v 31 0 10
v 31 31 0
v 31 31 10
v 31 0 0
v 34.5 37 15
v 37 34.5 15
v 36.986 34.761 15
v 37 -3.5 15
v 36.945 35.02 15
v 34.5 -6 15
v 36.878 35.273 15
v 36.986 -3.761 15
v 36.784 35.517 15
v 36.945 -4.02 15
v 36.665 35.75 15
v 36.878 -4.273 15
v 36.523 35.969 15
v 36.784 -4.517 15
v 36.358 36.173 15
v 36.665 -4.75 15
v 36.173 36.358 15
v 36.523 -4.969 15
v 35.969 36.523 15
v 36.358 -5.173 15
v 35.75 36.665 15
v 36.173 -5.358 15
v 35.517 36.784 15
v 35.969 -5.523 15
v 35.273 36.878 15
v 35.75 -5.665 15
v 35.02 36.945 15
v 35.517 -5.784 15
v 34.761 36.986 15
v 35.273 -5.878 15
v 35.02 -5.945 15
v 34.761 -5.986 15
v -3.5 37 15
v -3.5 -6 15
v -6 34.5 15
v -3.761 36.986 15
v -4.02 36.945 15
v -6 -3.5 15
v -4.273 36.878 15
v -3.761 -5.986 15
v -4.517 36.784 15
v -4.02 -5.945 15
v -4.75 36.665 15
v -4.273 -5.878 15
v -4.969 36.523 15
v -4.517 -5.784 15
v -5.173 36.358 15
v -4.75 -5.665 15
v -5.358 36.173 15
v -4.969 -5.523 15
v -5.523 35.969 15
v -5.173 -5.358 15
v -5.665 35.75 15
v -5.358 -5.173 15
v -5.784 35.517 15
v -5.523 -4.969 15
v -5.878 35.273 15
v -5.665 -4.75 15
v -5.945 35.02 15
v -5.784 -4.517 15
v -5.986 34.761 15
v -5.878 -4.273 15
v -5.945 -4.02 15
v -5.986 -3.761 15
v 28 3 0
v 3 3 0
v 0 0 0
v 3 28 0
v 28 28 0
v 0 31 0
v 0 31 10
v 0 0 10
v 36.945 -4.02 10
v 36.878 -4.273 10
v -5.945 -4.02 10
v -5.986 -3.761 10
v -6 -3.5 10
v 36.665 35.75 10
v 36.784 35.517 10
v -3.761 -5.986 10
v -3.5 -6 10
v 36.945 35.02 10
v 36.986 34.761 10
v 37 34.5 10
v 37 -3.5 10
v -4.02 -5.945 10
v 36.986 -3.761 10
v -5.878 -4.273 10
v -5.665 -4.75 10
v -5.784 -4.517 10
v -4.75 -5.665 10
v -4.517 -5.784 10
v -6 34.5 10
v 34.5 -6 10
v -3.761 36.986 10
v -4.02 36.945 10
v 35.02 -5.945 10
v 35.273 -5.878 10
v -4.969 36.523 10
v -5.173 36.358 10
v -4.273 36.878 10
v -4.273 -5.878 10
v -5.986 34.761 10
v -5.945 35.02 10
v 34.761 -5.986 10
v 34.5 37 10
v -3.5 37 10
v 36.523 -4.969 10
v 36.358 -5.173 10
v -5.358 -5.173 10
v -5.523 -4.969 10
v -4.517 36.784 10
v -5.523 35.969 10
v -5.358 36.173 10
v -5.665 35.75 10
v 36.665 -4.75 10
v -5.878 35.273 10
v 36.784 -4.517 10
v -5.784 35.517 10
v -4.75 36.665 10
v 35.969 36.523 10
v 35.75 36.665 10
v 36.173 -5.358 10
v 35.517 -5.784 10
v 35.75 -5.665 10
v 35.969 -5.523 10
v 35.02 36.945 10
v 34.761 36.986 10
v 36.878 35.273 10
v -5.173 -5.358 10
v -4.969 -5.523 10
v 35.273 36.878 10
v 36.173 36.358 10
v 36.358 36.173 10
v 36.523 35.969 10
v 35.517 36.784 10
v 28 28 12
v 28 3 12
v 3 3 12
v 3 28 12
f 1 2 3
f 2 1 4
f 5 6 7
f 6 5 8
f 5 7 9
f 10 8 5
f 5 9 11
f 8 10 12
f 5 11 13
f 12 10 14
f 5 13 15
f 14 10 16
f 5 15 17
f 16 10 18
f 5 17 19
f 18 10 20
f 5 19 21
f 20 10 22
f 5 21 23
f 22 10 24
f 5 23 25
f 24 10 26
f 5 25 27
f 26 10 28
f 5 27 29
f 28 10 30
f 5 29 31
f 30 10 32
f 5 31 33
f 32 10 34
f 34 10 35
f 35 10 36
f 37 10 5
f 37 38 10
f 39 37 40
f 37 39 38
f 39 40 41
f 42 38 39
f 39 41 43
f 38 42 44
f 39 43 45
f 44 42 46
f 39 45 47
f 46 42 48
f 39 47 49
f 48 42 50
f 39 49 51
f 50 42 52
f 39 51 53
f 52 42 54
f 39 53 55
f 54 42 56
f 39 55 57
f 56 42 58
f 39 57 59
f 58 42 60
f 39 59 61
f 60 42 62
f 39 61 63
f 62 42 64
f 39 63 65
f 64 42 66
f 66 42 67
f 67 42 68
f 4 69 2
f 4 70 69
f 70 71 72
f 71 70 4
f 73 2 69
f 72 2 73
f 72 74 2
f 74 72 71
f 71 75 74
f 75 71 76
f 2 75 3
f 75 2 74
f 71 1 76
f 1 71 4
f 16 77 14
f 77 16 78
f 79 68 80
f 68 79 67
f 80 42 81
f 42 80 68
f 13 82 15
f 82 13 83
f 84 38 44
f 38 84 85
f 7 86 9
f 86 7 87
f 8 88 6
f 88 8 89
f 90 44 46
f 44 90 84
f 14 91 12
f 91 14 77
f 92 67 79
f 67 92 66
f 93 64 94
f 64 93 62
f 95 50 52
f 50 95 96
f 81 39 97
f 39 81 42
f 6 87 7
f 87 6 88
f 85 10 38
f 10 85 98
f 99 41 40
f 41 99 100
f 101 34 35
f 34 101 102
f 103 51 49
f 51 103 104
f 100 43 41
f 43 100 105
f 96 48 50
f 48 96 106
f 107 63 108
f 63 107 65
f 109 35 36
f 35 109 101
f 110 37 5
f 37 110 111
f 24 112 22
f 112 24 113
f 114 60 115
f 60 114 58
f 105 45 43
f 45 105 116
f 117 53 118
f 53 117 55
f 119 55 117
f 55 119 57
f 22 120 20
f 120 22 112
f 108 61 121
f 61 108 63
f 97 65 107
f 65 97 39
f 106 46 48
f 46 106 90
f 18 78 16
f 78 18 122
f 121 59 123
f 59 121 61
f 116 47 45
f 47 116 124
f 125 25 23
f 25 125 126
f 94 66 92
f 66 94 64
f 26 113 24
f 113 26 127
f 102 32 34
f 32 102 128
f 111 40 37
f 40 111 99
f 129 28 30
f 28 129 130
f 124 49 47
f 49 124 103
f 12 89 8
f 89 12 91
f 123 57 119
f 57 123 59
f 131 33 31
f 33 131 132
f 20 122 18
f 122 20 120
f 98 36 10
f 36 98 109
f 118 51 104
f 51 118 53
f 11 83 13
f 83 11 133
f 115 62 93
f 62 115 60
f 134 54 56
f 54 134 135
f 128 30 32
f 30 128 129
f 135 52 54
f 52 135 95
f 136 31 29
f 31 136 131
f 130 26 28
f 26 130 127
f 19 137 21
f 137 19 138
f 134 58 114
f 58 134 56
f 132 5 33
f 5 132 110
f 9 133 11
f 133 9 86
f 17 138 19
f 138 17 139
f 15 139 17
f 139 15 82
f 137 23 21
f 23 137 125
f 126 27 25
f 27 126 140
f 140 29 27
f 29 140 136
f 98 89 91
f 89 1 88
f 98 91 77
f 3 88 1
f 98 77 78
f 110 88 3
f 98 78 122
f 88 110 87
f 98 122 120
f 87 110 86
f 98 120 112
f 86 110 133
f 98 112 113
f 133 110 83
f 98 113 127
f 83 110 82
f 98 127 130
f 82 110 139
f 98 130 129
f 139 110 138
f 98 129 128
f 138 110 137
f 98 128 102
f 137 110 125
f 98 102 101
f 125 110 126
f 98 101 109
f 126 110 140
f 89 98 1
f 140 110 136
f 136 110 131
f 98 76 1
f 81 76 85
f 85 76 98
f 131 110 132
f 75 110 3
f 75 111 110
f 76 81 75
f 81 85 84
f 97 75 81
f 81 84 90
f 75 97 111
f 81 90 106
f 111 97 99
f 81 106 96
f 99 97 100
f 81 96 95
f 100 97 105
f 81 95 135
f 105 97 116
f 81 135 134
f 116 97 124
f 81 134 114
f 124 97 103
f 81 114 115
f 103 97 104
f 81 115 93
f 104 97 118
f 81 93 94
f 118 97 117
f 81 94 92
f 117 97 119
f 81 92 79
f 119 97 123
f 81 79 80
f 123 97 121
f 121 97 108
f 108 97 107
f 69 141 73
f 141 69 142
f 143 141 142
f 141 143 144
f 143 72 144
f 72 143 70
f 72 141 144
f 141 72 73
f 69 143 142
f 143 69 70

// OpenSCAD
// file: widgets/_mount.scad
// Ansible widget cases
//
// Mount: base mount for widgets
// -----------------------------------------------------------------------------

include <../params.scad>;

// -----------------------------------------------------------------------------

module widget_mount() {
	color(WIDGET_MOUNT_COLOR) {
		// Square base
		difference() {
			// Outside
			union() {
				// Base
				cube([WIDGET_MOUNT_SIZE, WIDGET_MOUNT_SIZE, MOUNT_HEIGHT]);
				
				// Grip
				translate([
					-GRIP_THICKNESS / 2,
					-GRIP_THICKNESS / 2,
					MOUNT_HEIGHT - GRIP_HEIGHT
				])
					linear_extrude(height=GRIP_HEIGHT)
					hull() {
						translate([
							0,
							0,
							0
						])
							circle(r=WIDGET_BORDER_RADIUS, $fn=SEGMENTS);
					
						translate([
							WIDGET_MOUNT_SIZE + GRIP_THICKNESS,
							0,
							0
						])
							circle(r=WIDGET_BORDER_RADIUS, $fn=SEGMENTS);
					
						translate([
							0,
							WIDGET_MOUNT_SIZE + GRIP_THICKNESS,
							0,
						])
							circle(r=WIDGET_BORDER_RADIUS, $fn=SEGMENTS);
					
						translate([
							WIDGET_MOUNT_SIZE + GRIP_THICKNESS,
							WIDGET_MOUNT_SIZE + GRIP_THICKNESS,
							0,
						])
							circle(r=WIDGET_BORDER_RADIUS, $fn=SEGMENTS);
					}
			}
			
			// Carve out inside
			translate([
				WIDGET_MOUNT_THICKNESS,
				WIDGET_MOUNT_THICKNESS,
				-WIDGET_MOUNT_THICKNESS
			])
				cube([
					WIDGET_MOUNT_SIZE - WIDGET_MOUNT_THICKNESS * 2,
					WIDGET_MOUNT_SIZE - WIDGET_MOUNT_THICKNESS * 2,
					MOUNT_HEIGHT
				]);
		}
	}
}
// file: params.scad
// Ansible widget cases
//
// Params: sets the we want
// -----------------------------------------------------------------------------

// Overall case
CASE_WIDTH = 90;
CASE_LENGTH = 140;
CASE_HEIGHT = 55;
WALL_THICKNESS = 3;
FLOOR_THICKNESS = WALL_THICKNESS;
SEGMENTS = 60;

// -----------------------------------------------------------------------------

// Front door
FRONT_DOOR_THICKNESS = 3;
FRONT_DOOR_INSET = 1;  // how much gap to give
FRONT_DOOR_OFFSET_Y = 4; // how far in from the edge
FRONT_DOOR_WIDTH = CASE_WIDTH - WALL_THICKNESS - FRONT_DOOR_INSET;
FRONT_DOOR_HEIGHT = CASE_HEIGHT - (WALL_THICKNESS * 2) + (FRONT_DOOR_INSET * 2);

// -----------------------------------------------------------------------------

// Pi shelf
SHELF_THICKNESS = WALL_THICKNESS - 1;
SHELF_Y = 52;
SHELF_LENGTH = 40;
SHELF_HEIGHT = 28;
SHELF_PEG_OFFSET_X = 3.5;
SHELF_PEG_OFFSET_Y = 3.0;
SHELF_PEG_HEIGHT = 4;
SHELF_PEG_RADIUS_BASE = 2.5 / 2;
SHELF_PEG_RADIUS_TOP = 1.75 / 2;

// -----------------------------------------------------------------------------

// Lid
LID_THICKNESS = WALL_THICKNESS;
DOCK_BORDER_HEIGHT = 9;
DOCK_BORDER_THICKNESS = 4;
DOCK_INSET = 2;

// Lid ridge
RIDGE_THICKNESS = WALL_THICKNESS * 2;
RIDGE_PEG_HEIGHT = 4;
RIDGE_PEG_RADIUS_BASE = 2.5 / 2;
RIDGE_PEG_RADIUS_TOP = 1.75 / 2;
RIDGE_PEG_RADIUS_HOLE = 2.3 / 2;
RIDGE_PEG_OFFSET = 5;

// -----------------------------------------------------------------------------

// General mount
MOUNT_HEIGHT = 15;
MOUNT_THICKNESS = 3;
MOUNT_SEGMENTS = 360;
GRIP_HEIGHT = 5;
GRIP_THICKNESS = 7;
LABEL_MOUNT_HEIGHT = 1;
LABEL_MOUNT_FONT_SIZE = 6;
LABEL_MOUNT_FONT = "Avenir Pro:style=Bold";

// Selector dock
SELECTOR_DOCK_Y = CASE_LENGTH * .78;
SELECTOR_DOCK_RADIUS = 18;
SELECTOR_DOCK_BORDER_RADIUS = SELECTOR_DOCK_RADIUS + DOCK_BORDER_THICKNESS;
SELECTOR_HOLE_OFFSET = DOCK_BORDER_THICKNESS;
SELECTOR_HOLE_SIZE = SELECTOR_DOCK_RADIUS - SELECTOR_HOLE_OFFSET;
SELECTOR_LABEL_Y = -SELECTOR_DOCK_RADIUS - 2;

// Selector mount
SELECTOR_MOUNT_COLOR = [0.6, 0.6, 0.8];
SELECTOR_MOUNT_OFFSET = 0.5;
SELECTOR_MOUNT_THICKNESS = WALL_THICKNESS;
SELECTOR_MOUNT_RADIUS = SELECTOR_DOCK_RADIUS - SELECTOR_MOUNT_OFFSET;
SELECTOR_HOLE_RADIUS = SELECTOR_MOUNT_RADIUS - SELECTOR_HOLE_OFFSET;

// Widget dock
WIDGET_DOCK_Y = CASE_LENGTH * .15;
WIDGET_DOCK_SIZE = 32;
WIDGET_BORDER_RADIUS = 2.5;
WIDGET_HOLE_OFFSET = DOCK_BORDER_THICKNESS * 2;
WIDGET_HOLE_SIZE = WIDGET_DOCK_SIZE - WIDGET_HOLE_OFFSET;

// Widget mount
WIDGET_MOUNT_COLOR = [0.8, 0.6, 0.6];
WIDGET_MOUNT_OFFSET = 1;
WIDGET_MOUNT_THICKNESS = WALL_THICKNESS;
WIDGET_MOUNT_SIZE = WIDGET_DOCK_SIZE - WIDGET_MOUNT_OFFSET;
WIDGET_MOUNT_HOLE_SIZE = WIDGET_MOUNT_SIZE - WIDGET_HOLE_OFFSET;

// -----------------------------------------------------------------------------

// Pi
PI_COLOR = [0.3, 0.4, 0.3];
PI_Y = SHELF_Y + 5;
PI_WIDTH = 66.04;
PI_LENGTH = 30.48;
PI_DEPTH = 1.5;
PI_HOLE_RADIUS = 2 / 2;
PI_HOLE_OFFSET_X = 3.5;
PI_HOLE_OFFSET_Y = 3.0;

// Battery pack
BATTERY_COLOR = [0.2, 0.2, 0.2];
BATTERY_WIDTH = 68.58;
BATTERY_LENGTH = 96.52;
BATTERY_DEPTH = 22.86;

BATTERY_DIAMETER = 23;

BATTERY_GUIDE_OFFSET_X = -5.5;
BATTERY_GUIDE_WIDTH = 4;
BATTERY_GUIDE_HEIGHT = 4;
BATTERY_GUIDE_LENGTH = CASE_LENGTH * .65;

// -----------------------------------------------------------------------------

// Magnet selector

MAGNET_BOARD_WIDTH = 23;
MAGNET_BOARD_HEIGHT = 21;

MAGNET_HOLE_OFFSET = 2;
MAGNET_HOLE_WIDTH = MAGNET_BOARD_WIDTH - MAGNET_HOLE_OFFSET;
MAGNET_HOLE_LENGTH = 10.5;

MAGNET_BOARD_INSET = 1;
MAGNET_BOARD_INSET_WIDTH = MAGNET_BOARD_WIDTH + MAGNET_BOARD_INSET;
MAGNET_BOARD_INSET_HEIGHT = MAGNET_BOARD_HEIGHT + MAGNET_BOARD_INSET;
MAGNET_BOARD_INSET_DEPTH = 1;

MAGNET_PEG_HEIGHT = 4;
MAGNET_PEG_RADIUS_BASE = 2.5 / 2;
MAGNET_PEG_RADIUS_TOP = 1.75 / 2;
MAGNET_PEG_OFFSET_X = -0.25;
MAGNET_PEG_OFFSET_Y = 0.7;
MAGNET_PEG_OFFSET_Z = -MAGNET_BOARD_INSET;

MAGNET_PEG_HOLE_RADIUS = 2.5 / 2;
MAGNET_PEG_HOLE_OFFSET_X = 1 + MAGNET_PEG_HOLE_RADIUS;
MAGNET_PEG_HOLE_OFFSET_Y = 1 + MAGNET_PEG_HOLE_RADIUS;

// -----------------------------------------------------------------------------

// Light selector

LIGHT_BOARD_WIDTH = 19;
LIGHT_BOARD_HEIGHT = 16;

LIGHT_HOLE_OFFSET = 2;
LIGHT_HOLE_WIDTH = LIGHT_BOARD_WIDTH - LIGHT_HOLE_OFFSET;
LIGHT_HOLE_LENGTH = 8;

LIGHT_BOARD_INSET = 1;
LIGHT_BOARD_INSET_WIDTH = LIGHT_BOARD_WIDTH + LIGHT_BOARD_INSET;
LIGHT_BOARD_INSET_HEIGHT = LIGHT_BOARD_HEIGHT + LIGHT_BOARD_INSET;
LIGHT_BOARD_INSET_DEPTH = 1;

LIGHT_PEG_HEIGHT = 4;
LIGHT_PEG_RADIUS_BASE = 2.5 / 2;
LIGHT_PEG_RADIUS_TOP = 1.75 / 2;
LIGHT_PEG_OFFSET_X = 1.65;
LIGHT_PEG_OFFSET_Y = 3.65;
LIGHT_PEG_OFFSET_Z = -LIGHT_BOARD_INSET;

LIGHT_PEG_HOLE_RADIUS = 2.3 / 2;
LIGHT_PEG_HOLE_OFFSET_X = 1 + LIGHT_PEG_HOLE_RADIUS;
LIGHT_PEG_HOLE_OFFSET_Y = 1.5 + LIGHT_PEG_HOLE_RADIUS;
// main file
// Ansible widget cases
//
// Widgets: shows all the widgets
// -----------------------------------------------------------------------------

include <params.scad>;

use <widgets/_mount.scad>;

// -----------------------------------------------------------------------------

X_TRANSLATION = WIDGET_DOCK_SIZE * 2;

// -----------------------------------------------------------------------------

// Blank mount
translate([
	0,
	0,
	0,
])
	widget_mount();

// -----------------------------------------------------------------------------
